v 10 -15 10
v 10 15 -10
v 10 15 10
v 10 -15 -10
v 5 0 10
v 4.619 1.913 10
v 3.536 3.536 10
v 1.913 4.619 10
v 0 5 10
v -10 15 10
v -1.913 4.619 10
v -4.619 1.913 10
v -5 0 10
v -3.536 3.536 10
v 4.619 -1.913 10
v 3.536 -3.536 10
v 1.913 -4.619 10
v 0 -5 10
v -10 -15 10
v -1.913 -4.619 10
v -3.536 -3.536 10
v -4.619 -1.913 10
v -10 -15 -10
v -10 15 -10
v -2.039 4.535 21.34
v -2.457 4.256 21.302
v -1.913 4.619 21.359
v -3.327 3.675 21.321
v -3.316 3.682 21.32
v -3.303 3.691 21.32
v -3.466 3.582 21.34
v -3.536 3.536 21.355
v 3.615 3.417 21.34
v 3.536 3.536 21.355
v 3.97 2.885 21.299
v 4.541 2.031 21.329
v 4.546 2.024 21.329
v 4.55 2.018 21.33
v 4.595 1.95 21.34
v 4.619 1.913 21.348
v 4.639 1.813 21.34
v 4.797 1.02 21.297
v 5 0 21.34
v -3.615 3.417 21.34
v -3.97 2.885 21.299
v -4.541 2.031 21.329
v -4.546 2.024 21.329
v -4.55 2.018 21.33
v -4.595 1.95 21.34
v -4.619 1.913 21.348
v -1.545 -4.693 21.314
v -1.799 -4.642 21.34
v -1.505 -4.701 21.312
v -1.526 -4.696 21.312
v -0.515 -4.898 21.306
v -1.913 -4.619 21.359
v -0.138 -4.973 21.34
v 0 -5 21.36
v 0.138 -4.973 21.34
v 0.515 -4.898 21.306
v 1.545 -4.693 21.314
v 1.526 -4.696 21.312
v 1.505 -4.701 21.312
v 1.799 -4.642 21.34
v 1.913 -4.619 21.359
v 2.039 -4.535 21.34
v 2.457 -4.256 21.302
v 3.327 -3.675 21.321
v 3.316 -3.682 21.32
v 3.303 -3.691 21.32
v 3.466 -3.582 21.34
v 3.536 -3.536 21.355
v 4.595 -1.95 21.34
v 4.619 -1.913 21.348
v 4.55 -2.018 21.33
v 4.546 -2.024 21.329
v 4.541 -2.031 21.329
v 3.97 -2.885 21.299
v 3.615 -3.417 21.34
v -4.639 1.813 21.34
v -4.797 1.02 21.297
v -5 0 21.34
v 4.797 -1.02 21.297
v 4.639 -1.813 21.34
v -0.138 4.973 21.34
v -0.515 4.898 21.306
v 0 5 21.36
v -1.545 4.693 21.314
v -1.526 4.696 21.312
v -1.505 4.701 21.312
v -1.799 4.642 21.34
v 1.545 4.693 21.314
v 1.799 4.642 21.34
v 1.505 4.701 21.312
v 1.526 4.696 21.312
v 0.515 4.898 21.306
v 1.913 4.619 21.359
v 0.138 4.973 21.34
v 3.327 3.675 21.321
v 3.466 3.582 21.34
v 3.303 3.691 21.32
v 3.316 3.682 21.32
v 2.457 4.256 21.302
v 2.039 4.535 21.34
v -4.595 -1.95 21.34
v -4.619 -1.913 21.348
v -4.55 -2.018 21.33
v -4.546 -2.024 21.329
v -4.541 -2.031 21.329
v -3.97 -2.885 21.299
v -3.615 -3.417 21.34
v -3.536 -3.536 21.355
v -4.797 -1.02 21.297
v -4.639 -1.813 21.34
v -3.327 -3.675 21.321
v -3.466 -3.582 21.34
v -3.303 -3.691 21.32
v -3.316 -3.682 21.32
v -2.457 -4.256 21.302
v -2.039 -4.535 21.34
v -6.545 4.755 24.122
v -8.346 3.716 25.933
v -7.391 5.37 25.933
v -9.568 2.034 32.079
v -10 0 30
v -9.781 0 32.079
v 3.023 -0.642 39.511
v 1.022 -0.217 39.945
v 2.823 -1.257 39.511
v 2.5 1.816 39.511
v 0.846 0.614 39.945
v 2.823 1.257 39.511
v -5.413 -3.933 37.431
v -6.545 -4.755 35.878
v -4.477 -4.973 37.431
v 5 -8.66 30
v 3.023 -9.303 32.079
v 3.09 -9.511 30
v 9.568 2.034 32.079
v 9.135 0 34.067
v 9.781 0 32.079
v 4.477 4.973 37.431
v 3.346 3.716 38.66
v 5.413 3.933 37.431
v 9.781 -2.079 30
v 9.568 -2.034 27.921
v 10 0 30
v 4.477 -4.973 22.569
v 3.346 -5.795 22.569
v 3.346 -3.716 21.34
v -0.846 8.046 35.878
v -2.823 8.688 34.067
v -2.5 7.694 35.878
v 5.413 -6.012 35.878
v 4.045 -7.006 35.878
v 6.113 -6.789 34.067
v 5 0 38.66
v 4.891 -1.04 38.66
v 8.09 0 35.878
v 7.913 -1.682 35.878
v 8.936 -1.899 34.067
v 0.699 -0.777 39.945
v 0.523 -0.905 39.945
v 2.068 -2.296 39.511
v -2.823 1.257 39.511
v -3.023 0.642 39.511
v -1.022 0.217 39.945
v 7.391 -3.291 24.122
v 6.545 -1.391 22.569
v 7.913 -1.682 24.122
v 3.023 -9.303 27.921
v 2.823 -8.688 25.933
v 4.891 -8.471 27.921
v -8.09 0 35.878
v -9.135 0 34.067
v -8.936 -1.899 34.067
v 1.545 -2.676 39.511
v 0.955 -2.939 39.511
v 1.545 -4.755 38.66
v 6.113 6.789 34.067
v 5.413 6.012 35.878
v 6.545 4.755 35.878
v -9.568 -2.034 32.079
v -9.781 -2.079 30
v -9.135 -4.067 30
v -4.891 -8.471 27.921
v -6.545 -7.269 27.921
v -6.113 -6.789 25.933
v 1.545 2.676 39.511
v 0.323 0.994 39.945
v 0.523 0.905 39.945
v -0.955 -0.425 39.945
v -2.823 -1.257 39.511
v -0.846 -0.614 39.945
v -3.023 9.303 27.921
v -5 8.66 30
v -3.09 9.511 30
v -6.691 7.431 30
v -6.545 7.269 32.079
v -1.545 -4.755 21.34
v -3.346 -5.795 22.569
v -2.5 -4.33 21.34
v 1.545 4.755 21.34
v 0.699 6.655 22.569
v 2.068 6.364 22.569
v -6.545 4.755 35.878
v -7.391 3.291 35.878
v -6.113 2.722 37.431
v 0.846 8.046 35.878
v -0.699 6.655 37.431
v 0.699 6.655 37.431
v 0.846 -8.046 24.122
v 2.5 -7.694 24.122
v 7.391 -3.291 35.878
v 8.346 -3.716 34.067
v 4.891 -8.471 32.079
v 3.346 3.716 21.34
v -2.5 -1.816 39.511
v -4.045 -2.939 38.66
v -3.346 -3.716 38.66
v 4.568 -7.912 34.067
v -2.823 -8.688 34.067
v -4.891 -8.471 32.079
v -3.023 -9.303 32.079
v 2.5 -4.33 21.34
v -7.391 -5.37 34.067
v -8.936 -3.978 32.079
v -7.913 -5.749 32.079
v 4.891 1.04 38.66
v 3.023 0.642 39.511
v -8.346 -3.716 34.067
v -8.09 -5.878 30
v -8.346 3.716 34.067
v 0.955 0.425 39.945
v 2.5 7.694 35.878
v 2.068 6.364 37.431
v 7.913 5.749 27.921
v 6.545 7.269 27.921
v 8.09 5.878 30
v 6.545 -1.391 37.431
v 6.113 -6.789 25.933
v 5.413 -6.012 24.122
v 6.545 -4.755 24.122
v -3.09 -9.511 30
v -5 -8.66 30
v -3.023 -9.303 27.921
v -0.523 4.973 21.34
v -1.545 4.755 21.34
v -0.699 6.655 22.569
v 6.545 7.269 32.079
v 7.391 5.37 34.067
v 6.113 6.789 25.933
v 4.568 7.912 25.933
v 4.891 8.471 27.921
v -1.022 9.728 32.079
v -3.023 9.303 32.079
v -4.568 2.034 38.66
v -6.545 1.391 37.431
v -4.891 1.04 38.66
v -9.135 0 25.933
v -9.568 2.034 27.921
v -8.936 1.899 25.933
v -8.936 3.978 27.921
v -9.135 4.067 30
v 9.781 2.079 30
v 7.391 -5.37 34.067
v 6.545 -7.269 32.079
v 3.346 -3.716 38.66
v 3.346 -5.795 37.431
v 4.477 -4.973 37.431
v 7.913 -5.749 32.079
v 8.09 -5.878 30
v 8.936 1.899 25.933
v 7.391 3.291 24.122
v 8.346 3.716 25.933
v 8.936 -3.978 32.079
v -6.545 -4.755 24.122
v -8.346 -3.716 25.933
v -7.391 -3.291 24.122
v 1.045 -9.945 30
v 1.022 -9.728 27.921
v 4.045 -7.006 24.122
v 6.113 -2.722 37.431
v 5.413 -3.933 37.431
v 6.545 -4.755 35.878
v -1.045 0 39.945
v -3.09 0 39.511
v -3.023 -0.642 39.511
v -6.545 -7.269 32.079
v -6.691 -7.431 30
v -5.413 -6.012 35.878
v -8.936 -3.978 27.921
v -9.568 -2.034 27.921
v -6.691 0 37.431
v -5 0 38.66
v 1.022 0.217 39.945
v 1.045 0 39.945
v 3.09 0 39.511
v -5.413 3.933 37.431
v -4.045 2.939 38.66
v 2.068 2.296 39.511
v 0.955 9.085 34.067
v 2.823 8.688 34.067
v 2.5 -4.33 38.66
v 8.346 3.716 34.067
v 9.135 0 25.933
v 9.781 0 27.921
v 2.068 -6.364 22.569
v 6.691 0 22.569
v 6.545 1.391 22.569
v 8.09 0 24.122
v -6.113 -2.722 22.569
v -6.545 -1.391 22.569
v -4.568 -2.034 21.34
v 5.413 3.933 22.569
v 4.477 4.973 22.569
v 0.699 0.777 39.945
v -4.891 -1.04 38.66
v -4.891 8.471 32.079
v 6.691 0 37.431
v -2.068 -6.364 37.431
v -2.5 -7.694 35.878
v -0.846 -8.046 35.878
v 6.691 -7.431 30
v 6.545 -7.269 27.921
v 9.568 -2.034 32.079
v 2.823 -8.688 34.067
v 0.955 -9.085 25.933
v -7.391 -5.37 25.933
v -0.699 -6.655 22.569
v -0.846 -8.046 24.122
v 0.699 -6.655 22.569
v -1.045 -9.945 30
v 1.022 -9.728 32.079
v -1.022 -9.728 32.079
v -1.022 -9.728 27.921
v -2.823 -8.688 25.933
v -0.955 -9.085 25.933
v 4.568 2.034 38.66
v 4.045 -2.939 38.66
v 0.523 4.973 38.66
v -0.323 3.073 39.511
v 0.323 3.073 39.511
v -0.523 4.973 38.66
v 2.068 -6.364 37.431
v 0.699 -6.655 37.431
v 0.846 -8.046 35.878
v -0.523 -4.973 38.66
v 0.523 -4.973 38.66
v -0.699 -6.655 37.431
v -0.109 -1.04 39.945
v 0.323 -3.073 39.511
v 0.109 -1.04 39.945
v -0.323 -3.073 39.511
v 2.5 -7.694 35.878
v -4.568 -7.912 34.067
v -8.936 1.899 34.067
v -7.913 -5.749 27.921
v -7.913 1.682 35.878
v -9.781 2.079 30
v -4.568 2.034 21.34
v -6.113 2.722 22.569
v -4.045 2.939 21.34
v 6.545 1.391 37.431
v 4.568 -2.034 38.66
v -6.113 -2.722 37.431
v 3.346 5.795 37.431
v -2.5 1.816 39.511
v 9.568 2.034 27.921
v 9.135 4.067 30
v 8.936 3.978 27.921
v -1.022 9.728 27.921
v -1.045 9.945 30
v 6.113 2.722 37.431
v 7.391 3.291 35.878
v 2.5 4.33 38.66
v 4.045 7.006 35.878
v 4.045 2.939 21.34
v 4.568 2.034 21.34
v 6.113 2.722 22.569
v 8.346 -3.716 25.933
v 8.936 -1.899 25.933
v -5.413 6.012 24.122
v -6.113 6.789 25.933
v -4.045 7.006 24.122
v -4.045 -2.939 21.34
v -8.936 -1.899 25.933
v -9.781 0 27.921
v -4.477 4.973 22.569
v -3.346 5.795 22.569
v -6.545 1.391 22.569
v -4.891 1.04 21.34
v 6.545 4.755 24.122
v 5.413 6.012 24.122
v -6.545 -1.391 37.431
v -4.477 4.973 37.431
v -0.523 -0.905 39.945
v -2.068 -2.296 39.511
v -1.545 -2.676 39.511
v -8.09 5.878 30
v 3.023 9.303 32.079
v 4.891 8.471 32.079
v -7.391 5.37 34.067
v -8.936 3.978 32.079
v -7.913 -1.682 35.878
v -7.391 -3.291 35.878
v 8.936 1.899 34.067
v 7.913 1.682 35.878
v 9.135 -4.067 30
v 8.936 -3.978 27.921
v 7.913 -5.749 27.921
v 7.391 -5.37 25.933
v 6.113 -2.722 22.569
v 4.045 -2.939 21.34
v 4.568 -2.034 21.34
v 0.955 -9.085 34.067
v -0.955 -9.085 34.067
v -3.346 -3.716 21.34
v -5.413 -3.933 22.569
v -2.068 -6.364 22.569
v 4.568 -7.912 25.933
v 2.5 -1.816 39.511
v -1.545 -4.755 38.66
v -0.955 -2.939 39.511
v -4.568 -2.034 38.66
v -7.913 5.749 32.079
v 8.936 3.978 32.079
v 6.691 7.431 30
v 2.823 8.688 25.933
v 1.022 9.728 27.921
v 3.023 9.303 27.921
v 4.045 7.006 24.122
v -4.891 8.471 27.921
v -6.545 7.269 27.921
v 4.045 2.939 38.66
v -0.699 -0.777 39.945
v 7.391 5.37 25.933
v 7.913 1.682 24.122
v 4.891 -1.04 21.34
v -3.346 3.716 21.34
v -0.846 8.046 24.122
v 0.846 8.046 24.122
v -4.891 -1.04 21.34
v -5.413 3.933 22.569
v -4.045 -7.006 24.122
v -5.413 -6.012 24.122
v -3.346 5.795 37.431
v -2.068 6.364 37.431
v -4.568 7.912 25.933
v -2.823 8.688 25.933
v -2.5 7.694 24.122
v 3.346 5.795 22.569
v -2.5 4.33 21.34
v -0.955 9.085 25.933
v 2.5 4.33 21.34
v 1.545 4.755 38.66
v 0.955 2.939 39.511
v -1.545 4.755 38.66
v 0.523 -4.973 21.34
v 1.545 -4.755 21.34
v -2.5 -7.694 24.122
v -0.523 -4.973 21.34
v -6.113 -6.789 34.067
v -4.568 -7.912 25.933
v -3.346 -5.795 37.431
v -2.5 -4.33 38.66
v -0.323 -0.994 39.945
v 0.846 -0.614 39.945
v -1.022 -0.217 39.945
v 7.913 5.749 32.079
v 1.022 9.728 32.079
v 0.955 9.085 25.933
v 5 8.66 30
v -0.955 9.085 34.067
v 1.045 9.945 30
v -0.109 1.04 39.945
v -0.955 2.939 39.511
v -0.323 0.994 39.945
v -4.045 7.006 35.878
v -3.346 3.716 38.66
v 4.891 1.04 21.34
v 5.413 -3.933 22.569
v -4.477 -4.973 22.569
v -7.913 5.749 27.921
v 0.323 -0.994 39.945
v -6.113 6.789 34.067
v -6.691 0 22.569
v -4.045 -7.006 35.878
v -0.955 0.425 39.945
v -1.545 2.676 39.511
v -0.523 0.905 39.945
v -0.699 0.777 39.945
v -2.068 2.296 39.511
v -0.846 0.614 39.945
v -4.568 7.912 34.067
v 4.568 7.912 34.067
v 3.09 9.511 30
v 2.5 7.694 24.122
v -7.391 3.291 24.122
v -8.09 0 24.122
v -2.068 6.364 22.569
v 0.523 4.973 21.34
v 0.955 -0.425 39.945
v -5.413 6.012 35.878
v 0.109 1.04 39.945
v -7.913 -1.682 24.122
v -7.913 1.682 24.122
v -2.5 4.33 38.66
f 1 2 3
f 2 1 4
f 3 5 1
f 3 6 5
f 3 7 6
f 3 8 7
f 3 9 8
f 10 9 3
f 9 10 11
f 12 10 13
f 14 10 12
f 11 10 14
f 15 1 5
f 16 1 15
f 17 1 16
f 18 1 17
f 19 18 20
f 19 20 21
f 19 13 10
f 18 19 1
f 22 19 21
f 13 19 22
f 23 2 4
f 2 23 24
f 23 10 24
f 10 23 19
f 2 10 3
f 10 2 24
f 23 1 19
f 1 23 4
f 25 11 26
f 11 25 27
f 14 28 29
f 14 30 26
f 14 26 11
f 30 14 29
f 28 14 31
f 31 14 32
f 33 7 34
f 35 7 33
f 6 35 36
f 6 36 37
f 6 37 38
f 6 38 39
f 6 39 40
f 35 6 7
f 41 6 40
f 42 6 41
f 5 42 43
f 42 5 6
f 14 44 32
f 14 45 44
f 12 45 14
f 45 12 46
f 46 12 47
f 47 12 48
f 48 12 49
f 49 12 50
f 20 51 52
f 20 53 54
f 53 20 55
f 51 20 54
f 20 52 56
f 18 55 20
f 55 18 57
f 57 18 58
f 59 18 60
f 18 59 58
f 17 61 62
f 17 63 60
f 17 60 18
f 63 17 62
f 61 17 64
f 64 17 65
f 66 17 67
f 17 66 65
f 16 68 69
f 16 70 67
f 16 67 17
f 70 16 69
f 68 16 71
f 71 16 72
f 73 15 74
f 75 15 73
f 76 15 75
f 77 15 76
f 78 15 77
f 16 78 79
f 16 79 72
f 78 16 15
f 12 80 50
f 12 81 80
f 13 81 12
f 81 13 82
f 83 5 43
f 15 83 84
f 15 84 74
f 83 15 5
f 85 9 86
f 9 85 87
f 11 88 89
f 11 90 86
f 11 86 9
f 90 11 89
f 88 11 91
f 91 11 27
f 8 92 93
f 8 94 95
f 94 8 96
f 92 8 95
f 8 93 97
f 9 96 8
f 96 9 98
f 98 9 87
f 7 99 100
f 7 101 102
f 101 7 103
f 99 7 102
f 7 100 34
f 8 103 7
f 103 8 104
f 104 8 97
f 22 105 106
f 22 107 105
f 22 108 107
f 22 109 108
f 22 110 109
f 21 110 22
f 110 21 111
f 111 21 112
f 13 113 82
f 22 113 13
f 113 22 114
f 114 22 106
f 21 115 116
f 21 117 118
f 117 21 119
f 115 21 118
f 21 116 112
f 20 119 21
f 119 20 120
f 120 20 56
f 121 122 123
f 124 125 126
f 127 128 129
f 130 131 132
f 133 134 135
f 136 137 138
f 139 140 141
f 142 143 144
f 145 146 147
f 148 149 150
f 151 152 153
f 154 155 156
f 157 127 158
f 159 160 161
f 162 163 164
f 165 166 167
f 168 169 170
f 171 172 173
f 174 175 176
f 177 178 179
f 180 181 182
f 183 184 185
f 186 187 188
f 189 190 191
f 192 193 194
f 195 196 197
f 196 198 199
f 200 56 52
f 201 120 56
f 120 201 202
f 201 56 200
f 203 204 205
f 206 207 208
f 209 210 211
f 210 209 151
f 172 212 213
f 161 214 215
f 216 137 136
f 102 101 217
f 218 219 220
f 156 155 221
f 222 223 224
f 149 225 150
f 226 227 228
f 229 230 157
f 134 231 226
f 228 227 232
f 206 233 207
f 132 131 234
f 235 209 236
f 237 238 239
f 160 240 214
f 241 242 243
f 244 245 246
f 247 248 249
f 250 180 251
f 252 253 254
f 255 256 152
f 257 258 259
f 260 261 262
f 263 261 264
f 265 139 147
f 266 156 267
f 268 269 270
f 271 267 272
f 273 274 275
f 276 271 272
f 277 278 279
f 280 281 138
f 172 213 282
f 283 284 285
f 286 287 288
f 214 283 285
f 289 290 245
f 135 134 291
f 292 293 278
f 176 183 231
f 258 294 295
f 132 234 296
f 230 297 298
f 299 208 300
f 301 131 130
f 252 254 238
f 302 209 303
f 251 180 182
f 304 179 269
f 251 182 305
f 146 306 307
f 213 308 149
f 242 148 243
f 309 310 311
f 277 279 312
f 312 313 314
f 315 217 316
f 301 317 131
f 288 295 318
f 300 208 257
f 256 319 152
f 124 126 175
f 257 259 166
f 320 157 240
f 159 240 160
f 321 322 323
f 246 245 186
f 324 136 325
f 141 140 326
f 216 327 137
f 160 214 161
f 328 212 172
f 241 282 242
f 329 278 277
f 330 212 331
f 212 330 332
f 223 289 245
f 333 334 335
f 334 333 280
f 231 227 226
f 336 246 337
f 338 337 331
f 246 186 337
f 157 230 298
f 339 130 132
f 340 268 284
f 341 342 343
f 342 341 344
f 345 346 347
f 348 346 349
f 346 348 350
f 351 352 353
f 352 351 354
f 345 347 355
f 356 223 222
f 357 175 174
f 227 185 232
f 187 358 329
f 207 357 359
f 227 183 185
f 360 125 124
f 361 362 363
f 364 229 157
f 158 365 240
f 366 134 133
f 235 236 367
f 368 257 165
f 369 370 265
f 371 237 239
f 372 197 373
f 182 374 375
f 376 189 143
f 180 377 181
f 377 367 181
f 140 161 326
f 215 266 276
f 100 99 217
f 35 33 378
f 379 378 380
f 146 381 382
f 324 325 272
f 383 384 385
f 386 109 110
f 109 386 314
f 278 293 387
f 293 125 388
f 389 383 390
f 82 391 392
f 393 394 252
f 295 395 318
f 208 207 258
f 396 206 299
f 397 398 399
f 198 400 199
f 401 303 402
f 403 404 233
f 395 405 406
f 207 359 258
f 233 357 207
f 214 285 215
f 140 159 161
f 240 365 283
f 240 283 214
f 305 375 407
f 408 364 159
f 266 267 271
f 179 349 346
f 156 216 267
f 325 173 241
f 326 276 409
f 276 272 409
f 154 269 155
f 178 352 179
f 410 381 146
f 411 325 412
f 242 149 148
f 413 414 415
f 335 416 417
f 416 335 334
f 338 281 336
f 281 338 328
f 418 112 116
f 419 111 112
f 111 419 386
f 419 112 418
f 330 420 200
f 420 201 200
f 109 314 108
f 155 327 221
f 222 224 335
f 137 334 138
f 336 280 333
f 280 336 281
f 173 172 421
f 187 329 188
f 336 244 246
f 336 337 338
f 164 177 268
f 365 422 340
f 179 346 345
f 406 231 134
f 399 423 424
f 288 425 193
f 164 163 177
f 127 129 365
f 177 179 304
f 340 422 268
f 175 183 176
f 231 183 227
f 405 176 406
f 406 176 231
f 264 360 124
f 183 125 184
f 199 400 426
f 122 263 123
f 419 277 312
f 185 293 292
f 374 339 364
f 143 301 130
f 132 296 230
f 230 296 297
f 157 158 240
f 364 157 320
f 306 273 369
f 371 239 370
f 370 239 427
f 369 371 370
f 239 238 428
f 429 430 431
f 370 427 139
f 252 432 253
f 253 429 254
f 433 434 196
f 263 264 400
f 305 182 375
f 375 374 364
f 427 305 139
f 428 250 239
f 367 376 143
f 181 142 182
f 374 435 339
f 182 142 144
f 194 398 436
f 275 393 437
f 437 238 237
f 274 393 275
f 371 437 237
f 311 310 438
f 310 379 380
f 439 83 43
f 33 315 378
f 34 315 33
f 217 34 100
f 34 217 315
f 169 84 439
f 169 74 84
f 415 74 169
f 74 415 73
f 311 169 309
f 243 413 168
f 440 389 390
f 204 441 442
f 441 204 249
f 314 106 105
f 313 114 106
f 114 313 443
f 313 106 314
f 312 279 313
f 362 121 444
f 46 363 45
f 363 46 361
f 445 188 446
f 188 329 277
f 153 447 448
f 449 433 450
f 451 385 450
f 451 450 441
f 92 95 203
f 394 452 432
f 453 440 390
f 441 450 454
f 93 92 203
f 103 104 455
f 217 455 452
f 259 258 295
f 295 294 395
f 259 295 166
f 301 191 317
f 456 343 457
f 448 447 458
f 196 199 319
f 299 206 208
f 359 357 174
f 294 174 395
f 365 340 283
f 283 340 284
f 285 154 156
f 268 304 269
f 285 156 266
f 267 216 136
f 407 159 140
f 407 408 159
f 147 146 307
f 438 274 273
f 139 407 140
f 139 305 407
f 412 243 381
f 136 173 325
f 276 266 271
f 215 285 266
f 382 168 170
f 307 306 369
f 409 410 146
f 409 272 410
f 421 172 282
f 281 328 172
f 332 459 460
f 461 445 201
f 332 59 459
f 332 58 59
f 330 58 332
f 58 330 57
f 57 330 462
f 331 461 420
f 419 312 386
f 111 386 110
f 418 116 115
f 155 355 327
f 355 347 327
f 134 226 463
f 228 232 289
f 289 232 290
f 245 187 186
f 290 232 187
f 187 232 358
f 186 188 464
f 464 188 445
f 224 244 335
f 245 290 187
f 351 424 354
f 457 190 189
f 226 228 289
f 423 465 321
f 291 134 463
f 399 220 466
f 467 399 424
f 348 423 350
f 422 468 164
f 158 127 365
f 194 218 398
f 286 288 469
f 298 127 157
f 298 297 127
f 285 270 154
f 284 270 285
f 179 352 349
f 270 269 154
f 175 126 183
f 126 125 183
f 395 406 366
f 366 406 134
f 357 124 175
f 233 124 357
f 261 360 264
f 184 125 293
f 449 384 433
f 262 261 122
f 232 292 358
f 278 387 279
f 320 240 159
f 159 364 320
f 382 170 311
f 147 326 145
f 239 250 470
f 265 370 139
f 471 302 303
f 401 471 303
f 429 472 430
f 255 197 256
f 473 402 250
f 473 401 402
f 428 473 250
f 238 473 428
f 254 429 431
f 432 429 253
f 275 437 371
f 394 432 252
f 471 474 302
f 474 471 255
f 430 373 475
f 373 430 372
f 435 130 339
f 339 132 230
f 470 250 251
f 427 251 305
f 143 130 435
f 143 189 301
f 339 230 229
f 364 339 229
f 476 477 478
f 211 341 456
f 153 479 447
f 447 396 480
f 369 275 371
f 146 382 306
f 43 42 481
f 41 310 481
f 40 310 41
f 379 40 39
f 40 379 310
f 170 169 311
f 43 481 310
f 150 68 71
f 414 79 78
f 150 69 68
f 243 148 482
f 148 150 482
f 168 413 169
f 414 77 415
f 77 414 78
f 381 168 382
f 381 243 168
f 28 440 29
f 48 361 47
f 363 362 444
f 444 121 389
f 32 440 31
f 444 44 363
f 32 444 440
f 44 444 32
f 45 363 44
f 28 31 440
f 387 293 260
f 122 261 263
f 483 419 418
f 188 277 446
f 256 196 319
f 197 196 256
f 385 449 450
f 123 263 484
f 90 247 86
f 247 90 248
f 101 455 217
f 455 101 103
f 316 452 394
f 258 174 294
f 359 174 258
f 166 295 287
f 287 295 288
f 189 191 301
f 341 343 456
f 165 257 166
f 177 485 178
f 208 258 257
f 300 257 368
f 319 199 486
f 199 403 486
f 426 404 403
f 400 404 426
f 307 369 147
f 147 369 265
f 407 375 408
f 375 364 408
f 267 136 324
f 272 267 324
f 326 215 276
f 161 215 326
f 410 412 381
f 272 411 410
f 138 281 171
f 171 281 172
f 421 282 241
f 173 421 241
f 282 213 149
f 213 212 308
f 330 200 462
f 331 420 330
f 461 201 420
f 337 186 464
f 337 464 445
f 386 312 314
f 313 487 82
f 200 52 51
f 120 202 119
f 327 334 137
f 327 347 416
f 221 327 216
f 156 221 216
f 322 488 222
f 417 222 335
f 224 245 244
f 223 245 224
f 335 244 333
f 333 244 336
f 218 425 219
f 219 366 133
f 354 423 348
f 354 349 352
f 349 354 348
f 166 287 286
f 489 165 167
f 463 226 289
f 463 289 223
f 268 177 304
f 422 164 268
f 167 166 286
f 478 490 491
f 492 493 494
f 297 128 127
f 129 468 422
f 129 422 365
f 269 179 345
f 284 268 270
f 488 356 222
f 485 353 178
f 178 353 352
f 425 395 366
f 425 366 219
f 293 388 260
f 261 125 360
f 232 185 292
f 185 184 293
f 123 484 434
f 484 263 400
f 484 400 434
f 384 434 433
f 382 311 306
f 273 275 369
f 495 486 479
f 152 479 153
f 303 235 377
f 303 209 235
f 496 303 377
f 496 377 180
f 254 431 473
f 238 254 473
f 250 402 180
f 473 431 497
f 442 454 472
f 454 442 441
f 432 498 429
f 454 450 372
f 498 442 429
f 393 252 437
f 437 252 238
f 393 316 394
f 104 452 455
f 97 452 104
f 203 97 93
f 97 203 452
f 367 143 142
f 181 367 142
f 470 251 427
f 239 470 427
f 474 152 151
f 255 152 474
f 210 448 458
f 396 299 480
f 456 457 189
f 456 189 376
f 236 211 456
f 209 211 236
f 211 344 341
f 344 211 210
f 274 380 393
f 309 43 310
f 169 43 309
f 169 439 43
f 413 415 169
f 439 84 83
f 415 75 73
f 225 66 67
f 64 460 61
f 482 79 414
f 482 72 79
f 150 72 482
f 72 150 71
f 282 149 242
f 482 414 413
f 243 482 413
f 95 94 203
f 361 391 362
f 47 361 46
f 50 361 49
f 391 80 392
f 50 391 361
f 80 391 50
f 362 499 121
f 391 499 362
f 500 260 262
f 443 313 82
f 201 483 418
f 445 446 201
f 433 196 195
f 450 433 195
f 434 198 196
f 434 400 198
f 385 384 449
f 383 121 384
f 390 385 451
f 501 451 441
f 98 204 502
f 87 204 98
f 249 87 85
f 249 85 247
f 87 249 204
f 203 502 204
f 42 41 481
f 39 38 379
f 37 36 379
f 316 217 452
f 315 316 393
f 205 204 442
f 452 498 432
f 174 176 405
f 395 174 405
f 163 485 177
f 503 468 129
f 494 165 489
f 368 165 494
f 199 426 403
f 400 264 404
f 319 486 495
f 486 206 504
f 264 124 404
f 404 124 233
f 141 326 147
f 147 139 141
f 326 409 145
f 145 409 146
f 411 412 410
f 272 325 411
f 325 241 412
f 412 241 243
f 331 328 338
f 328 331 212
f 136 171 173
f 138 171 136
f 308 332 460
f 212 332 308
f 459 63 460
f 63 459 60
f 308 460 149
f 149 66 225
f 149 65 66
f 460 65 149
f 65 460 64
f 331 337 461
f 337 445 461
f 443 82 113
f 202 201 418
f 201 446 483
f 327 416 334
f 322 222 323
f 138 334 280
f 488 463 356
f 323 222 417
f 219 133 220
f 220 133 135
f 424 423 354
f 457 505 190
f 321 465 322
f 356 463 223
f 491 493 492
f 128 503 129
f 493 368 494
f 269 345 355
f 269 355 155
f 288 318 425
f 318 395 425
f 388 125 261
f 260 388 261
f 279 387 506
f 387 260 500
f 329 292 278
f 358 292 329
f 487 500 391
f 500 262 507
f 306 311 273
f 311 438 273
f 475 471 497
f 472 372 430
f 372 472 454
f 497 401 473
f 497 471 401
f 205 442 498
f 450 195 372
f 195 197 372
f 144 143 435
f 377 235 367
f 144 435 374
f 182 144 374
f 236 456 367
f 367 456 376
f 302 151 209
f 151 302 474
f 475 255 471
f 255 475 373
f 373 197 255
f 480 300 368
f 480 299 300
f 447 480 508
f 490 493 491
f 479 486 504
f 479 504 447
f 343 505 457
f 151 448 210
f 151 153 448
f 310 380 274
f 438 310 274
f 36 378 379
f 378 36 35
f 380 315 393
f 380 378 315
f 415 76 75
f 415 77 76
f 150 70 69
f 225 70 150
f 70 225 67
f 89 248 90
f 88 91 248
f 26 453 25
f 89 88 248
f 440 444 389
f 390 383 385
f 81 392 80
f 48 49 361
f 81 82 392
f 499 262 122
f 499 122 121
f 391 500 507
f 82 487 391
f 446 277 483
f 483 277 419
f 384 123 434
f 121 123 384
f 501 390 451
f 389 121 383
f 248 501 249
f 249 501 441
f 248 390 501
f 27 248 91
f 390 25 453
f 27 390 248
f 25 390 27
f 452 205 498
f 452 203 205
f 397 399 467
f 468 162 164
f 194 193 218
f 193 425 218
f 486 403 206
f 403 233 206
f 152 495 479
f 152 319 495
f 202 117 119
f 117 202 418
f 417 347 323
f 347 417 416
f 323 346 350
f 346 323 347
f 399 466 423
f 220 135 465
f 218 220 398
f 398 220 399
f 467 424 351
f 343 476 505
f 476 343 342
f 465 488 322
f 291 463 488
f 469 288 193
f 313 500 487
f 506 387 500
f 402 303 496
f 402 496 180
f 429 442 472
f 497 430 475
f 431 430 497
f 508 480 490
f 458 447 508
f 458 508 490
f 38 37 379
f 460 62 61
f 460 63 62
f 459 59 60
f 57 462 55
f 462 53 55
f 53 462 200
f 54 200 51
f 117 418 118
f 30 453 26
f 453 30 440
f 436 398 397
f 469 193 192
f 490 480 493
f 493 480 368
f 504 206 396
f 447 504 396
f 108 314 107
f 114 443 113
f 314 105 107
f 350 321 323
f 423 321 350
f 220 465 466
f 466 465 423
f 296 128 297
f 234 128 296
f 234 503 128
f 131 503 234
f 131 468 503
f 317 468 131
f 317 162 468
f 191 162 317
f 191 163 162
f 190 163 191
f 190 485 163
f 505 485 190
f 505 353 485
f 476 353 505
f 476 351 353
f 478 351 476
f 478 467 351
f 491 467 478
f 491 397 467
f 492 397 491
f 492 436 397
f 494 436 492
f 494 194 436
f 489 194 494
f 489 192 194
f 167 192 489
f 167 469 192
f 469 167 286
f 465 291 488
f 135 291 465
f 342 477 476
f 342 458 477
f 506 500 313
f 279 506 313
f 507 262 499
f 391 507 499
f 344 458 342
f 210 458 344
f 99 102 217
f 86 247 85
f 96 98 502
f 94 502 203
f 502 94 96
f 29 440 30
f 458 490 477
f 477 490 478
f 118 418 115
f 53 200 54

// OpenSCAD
/*
documentation: https://www.openscad.org/documentation.html

cheatsheet: Help -> cheatsheet


rotate: right click 
view drag: left click
zoom: Shift + Ctrl + left click 

Topic: basic solid shape
*/

//cube
cube([20,30,20], center = true);

//cylinder 
cylinder(r=5, h=30);


//sphere + translate
translate([0,0,30])
sphere(r=10);
